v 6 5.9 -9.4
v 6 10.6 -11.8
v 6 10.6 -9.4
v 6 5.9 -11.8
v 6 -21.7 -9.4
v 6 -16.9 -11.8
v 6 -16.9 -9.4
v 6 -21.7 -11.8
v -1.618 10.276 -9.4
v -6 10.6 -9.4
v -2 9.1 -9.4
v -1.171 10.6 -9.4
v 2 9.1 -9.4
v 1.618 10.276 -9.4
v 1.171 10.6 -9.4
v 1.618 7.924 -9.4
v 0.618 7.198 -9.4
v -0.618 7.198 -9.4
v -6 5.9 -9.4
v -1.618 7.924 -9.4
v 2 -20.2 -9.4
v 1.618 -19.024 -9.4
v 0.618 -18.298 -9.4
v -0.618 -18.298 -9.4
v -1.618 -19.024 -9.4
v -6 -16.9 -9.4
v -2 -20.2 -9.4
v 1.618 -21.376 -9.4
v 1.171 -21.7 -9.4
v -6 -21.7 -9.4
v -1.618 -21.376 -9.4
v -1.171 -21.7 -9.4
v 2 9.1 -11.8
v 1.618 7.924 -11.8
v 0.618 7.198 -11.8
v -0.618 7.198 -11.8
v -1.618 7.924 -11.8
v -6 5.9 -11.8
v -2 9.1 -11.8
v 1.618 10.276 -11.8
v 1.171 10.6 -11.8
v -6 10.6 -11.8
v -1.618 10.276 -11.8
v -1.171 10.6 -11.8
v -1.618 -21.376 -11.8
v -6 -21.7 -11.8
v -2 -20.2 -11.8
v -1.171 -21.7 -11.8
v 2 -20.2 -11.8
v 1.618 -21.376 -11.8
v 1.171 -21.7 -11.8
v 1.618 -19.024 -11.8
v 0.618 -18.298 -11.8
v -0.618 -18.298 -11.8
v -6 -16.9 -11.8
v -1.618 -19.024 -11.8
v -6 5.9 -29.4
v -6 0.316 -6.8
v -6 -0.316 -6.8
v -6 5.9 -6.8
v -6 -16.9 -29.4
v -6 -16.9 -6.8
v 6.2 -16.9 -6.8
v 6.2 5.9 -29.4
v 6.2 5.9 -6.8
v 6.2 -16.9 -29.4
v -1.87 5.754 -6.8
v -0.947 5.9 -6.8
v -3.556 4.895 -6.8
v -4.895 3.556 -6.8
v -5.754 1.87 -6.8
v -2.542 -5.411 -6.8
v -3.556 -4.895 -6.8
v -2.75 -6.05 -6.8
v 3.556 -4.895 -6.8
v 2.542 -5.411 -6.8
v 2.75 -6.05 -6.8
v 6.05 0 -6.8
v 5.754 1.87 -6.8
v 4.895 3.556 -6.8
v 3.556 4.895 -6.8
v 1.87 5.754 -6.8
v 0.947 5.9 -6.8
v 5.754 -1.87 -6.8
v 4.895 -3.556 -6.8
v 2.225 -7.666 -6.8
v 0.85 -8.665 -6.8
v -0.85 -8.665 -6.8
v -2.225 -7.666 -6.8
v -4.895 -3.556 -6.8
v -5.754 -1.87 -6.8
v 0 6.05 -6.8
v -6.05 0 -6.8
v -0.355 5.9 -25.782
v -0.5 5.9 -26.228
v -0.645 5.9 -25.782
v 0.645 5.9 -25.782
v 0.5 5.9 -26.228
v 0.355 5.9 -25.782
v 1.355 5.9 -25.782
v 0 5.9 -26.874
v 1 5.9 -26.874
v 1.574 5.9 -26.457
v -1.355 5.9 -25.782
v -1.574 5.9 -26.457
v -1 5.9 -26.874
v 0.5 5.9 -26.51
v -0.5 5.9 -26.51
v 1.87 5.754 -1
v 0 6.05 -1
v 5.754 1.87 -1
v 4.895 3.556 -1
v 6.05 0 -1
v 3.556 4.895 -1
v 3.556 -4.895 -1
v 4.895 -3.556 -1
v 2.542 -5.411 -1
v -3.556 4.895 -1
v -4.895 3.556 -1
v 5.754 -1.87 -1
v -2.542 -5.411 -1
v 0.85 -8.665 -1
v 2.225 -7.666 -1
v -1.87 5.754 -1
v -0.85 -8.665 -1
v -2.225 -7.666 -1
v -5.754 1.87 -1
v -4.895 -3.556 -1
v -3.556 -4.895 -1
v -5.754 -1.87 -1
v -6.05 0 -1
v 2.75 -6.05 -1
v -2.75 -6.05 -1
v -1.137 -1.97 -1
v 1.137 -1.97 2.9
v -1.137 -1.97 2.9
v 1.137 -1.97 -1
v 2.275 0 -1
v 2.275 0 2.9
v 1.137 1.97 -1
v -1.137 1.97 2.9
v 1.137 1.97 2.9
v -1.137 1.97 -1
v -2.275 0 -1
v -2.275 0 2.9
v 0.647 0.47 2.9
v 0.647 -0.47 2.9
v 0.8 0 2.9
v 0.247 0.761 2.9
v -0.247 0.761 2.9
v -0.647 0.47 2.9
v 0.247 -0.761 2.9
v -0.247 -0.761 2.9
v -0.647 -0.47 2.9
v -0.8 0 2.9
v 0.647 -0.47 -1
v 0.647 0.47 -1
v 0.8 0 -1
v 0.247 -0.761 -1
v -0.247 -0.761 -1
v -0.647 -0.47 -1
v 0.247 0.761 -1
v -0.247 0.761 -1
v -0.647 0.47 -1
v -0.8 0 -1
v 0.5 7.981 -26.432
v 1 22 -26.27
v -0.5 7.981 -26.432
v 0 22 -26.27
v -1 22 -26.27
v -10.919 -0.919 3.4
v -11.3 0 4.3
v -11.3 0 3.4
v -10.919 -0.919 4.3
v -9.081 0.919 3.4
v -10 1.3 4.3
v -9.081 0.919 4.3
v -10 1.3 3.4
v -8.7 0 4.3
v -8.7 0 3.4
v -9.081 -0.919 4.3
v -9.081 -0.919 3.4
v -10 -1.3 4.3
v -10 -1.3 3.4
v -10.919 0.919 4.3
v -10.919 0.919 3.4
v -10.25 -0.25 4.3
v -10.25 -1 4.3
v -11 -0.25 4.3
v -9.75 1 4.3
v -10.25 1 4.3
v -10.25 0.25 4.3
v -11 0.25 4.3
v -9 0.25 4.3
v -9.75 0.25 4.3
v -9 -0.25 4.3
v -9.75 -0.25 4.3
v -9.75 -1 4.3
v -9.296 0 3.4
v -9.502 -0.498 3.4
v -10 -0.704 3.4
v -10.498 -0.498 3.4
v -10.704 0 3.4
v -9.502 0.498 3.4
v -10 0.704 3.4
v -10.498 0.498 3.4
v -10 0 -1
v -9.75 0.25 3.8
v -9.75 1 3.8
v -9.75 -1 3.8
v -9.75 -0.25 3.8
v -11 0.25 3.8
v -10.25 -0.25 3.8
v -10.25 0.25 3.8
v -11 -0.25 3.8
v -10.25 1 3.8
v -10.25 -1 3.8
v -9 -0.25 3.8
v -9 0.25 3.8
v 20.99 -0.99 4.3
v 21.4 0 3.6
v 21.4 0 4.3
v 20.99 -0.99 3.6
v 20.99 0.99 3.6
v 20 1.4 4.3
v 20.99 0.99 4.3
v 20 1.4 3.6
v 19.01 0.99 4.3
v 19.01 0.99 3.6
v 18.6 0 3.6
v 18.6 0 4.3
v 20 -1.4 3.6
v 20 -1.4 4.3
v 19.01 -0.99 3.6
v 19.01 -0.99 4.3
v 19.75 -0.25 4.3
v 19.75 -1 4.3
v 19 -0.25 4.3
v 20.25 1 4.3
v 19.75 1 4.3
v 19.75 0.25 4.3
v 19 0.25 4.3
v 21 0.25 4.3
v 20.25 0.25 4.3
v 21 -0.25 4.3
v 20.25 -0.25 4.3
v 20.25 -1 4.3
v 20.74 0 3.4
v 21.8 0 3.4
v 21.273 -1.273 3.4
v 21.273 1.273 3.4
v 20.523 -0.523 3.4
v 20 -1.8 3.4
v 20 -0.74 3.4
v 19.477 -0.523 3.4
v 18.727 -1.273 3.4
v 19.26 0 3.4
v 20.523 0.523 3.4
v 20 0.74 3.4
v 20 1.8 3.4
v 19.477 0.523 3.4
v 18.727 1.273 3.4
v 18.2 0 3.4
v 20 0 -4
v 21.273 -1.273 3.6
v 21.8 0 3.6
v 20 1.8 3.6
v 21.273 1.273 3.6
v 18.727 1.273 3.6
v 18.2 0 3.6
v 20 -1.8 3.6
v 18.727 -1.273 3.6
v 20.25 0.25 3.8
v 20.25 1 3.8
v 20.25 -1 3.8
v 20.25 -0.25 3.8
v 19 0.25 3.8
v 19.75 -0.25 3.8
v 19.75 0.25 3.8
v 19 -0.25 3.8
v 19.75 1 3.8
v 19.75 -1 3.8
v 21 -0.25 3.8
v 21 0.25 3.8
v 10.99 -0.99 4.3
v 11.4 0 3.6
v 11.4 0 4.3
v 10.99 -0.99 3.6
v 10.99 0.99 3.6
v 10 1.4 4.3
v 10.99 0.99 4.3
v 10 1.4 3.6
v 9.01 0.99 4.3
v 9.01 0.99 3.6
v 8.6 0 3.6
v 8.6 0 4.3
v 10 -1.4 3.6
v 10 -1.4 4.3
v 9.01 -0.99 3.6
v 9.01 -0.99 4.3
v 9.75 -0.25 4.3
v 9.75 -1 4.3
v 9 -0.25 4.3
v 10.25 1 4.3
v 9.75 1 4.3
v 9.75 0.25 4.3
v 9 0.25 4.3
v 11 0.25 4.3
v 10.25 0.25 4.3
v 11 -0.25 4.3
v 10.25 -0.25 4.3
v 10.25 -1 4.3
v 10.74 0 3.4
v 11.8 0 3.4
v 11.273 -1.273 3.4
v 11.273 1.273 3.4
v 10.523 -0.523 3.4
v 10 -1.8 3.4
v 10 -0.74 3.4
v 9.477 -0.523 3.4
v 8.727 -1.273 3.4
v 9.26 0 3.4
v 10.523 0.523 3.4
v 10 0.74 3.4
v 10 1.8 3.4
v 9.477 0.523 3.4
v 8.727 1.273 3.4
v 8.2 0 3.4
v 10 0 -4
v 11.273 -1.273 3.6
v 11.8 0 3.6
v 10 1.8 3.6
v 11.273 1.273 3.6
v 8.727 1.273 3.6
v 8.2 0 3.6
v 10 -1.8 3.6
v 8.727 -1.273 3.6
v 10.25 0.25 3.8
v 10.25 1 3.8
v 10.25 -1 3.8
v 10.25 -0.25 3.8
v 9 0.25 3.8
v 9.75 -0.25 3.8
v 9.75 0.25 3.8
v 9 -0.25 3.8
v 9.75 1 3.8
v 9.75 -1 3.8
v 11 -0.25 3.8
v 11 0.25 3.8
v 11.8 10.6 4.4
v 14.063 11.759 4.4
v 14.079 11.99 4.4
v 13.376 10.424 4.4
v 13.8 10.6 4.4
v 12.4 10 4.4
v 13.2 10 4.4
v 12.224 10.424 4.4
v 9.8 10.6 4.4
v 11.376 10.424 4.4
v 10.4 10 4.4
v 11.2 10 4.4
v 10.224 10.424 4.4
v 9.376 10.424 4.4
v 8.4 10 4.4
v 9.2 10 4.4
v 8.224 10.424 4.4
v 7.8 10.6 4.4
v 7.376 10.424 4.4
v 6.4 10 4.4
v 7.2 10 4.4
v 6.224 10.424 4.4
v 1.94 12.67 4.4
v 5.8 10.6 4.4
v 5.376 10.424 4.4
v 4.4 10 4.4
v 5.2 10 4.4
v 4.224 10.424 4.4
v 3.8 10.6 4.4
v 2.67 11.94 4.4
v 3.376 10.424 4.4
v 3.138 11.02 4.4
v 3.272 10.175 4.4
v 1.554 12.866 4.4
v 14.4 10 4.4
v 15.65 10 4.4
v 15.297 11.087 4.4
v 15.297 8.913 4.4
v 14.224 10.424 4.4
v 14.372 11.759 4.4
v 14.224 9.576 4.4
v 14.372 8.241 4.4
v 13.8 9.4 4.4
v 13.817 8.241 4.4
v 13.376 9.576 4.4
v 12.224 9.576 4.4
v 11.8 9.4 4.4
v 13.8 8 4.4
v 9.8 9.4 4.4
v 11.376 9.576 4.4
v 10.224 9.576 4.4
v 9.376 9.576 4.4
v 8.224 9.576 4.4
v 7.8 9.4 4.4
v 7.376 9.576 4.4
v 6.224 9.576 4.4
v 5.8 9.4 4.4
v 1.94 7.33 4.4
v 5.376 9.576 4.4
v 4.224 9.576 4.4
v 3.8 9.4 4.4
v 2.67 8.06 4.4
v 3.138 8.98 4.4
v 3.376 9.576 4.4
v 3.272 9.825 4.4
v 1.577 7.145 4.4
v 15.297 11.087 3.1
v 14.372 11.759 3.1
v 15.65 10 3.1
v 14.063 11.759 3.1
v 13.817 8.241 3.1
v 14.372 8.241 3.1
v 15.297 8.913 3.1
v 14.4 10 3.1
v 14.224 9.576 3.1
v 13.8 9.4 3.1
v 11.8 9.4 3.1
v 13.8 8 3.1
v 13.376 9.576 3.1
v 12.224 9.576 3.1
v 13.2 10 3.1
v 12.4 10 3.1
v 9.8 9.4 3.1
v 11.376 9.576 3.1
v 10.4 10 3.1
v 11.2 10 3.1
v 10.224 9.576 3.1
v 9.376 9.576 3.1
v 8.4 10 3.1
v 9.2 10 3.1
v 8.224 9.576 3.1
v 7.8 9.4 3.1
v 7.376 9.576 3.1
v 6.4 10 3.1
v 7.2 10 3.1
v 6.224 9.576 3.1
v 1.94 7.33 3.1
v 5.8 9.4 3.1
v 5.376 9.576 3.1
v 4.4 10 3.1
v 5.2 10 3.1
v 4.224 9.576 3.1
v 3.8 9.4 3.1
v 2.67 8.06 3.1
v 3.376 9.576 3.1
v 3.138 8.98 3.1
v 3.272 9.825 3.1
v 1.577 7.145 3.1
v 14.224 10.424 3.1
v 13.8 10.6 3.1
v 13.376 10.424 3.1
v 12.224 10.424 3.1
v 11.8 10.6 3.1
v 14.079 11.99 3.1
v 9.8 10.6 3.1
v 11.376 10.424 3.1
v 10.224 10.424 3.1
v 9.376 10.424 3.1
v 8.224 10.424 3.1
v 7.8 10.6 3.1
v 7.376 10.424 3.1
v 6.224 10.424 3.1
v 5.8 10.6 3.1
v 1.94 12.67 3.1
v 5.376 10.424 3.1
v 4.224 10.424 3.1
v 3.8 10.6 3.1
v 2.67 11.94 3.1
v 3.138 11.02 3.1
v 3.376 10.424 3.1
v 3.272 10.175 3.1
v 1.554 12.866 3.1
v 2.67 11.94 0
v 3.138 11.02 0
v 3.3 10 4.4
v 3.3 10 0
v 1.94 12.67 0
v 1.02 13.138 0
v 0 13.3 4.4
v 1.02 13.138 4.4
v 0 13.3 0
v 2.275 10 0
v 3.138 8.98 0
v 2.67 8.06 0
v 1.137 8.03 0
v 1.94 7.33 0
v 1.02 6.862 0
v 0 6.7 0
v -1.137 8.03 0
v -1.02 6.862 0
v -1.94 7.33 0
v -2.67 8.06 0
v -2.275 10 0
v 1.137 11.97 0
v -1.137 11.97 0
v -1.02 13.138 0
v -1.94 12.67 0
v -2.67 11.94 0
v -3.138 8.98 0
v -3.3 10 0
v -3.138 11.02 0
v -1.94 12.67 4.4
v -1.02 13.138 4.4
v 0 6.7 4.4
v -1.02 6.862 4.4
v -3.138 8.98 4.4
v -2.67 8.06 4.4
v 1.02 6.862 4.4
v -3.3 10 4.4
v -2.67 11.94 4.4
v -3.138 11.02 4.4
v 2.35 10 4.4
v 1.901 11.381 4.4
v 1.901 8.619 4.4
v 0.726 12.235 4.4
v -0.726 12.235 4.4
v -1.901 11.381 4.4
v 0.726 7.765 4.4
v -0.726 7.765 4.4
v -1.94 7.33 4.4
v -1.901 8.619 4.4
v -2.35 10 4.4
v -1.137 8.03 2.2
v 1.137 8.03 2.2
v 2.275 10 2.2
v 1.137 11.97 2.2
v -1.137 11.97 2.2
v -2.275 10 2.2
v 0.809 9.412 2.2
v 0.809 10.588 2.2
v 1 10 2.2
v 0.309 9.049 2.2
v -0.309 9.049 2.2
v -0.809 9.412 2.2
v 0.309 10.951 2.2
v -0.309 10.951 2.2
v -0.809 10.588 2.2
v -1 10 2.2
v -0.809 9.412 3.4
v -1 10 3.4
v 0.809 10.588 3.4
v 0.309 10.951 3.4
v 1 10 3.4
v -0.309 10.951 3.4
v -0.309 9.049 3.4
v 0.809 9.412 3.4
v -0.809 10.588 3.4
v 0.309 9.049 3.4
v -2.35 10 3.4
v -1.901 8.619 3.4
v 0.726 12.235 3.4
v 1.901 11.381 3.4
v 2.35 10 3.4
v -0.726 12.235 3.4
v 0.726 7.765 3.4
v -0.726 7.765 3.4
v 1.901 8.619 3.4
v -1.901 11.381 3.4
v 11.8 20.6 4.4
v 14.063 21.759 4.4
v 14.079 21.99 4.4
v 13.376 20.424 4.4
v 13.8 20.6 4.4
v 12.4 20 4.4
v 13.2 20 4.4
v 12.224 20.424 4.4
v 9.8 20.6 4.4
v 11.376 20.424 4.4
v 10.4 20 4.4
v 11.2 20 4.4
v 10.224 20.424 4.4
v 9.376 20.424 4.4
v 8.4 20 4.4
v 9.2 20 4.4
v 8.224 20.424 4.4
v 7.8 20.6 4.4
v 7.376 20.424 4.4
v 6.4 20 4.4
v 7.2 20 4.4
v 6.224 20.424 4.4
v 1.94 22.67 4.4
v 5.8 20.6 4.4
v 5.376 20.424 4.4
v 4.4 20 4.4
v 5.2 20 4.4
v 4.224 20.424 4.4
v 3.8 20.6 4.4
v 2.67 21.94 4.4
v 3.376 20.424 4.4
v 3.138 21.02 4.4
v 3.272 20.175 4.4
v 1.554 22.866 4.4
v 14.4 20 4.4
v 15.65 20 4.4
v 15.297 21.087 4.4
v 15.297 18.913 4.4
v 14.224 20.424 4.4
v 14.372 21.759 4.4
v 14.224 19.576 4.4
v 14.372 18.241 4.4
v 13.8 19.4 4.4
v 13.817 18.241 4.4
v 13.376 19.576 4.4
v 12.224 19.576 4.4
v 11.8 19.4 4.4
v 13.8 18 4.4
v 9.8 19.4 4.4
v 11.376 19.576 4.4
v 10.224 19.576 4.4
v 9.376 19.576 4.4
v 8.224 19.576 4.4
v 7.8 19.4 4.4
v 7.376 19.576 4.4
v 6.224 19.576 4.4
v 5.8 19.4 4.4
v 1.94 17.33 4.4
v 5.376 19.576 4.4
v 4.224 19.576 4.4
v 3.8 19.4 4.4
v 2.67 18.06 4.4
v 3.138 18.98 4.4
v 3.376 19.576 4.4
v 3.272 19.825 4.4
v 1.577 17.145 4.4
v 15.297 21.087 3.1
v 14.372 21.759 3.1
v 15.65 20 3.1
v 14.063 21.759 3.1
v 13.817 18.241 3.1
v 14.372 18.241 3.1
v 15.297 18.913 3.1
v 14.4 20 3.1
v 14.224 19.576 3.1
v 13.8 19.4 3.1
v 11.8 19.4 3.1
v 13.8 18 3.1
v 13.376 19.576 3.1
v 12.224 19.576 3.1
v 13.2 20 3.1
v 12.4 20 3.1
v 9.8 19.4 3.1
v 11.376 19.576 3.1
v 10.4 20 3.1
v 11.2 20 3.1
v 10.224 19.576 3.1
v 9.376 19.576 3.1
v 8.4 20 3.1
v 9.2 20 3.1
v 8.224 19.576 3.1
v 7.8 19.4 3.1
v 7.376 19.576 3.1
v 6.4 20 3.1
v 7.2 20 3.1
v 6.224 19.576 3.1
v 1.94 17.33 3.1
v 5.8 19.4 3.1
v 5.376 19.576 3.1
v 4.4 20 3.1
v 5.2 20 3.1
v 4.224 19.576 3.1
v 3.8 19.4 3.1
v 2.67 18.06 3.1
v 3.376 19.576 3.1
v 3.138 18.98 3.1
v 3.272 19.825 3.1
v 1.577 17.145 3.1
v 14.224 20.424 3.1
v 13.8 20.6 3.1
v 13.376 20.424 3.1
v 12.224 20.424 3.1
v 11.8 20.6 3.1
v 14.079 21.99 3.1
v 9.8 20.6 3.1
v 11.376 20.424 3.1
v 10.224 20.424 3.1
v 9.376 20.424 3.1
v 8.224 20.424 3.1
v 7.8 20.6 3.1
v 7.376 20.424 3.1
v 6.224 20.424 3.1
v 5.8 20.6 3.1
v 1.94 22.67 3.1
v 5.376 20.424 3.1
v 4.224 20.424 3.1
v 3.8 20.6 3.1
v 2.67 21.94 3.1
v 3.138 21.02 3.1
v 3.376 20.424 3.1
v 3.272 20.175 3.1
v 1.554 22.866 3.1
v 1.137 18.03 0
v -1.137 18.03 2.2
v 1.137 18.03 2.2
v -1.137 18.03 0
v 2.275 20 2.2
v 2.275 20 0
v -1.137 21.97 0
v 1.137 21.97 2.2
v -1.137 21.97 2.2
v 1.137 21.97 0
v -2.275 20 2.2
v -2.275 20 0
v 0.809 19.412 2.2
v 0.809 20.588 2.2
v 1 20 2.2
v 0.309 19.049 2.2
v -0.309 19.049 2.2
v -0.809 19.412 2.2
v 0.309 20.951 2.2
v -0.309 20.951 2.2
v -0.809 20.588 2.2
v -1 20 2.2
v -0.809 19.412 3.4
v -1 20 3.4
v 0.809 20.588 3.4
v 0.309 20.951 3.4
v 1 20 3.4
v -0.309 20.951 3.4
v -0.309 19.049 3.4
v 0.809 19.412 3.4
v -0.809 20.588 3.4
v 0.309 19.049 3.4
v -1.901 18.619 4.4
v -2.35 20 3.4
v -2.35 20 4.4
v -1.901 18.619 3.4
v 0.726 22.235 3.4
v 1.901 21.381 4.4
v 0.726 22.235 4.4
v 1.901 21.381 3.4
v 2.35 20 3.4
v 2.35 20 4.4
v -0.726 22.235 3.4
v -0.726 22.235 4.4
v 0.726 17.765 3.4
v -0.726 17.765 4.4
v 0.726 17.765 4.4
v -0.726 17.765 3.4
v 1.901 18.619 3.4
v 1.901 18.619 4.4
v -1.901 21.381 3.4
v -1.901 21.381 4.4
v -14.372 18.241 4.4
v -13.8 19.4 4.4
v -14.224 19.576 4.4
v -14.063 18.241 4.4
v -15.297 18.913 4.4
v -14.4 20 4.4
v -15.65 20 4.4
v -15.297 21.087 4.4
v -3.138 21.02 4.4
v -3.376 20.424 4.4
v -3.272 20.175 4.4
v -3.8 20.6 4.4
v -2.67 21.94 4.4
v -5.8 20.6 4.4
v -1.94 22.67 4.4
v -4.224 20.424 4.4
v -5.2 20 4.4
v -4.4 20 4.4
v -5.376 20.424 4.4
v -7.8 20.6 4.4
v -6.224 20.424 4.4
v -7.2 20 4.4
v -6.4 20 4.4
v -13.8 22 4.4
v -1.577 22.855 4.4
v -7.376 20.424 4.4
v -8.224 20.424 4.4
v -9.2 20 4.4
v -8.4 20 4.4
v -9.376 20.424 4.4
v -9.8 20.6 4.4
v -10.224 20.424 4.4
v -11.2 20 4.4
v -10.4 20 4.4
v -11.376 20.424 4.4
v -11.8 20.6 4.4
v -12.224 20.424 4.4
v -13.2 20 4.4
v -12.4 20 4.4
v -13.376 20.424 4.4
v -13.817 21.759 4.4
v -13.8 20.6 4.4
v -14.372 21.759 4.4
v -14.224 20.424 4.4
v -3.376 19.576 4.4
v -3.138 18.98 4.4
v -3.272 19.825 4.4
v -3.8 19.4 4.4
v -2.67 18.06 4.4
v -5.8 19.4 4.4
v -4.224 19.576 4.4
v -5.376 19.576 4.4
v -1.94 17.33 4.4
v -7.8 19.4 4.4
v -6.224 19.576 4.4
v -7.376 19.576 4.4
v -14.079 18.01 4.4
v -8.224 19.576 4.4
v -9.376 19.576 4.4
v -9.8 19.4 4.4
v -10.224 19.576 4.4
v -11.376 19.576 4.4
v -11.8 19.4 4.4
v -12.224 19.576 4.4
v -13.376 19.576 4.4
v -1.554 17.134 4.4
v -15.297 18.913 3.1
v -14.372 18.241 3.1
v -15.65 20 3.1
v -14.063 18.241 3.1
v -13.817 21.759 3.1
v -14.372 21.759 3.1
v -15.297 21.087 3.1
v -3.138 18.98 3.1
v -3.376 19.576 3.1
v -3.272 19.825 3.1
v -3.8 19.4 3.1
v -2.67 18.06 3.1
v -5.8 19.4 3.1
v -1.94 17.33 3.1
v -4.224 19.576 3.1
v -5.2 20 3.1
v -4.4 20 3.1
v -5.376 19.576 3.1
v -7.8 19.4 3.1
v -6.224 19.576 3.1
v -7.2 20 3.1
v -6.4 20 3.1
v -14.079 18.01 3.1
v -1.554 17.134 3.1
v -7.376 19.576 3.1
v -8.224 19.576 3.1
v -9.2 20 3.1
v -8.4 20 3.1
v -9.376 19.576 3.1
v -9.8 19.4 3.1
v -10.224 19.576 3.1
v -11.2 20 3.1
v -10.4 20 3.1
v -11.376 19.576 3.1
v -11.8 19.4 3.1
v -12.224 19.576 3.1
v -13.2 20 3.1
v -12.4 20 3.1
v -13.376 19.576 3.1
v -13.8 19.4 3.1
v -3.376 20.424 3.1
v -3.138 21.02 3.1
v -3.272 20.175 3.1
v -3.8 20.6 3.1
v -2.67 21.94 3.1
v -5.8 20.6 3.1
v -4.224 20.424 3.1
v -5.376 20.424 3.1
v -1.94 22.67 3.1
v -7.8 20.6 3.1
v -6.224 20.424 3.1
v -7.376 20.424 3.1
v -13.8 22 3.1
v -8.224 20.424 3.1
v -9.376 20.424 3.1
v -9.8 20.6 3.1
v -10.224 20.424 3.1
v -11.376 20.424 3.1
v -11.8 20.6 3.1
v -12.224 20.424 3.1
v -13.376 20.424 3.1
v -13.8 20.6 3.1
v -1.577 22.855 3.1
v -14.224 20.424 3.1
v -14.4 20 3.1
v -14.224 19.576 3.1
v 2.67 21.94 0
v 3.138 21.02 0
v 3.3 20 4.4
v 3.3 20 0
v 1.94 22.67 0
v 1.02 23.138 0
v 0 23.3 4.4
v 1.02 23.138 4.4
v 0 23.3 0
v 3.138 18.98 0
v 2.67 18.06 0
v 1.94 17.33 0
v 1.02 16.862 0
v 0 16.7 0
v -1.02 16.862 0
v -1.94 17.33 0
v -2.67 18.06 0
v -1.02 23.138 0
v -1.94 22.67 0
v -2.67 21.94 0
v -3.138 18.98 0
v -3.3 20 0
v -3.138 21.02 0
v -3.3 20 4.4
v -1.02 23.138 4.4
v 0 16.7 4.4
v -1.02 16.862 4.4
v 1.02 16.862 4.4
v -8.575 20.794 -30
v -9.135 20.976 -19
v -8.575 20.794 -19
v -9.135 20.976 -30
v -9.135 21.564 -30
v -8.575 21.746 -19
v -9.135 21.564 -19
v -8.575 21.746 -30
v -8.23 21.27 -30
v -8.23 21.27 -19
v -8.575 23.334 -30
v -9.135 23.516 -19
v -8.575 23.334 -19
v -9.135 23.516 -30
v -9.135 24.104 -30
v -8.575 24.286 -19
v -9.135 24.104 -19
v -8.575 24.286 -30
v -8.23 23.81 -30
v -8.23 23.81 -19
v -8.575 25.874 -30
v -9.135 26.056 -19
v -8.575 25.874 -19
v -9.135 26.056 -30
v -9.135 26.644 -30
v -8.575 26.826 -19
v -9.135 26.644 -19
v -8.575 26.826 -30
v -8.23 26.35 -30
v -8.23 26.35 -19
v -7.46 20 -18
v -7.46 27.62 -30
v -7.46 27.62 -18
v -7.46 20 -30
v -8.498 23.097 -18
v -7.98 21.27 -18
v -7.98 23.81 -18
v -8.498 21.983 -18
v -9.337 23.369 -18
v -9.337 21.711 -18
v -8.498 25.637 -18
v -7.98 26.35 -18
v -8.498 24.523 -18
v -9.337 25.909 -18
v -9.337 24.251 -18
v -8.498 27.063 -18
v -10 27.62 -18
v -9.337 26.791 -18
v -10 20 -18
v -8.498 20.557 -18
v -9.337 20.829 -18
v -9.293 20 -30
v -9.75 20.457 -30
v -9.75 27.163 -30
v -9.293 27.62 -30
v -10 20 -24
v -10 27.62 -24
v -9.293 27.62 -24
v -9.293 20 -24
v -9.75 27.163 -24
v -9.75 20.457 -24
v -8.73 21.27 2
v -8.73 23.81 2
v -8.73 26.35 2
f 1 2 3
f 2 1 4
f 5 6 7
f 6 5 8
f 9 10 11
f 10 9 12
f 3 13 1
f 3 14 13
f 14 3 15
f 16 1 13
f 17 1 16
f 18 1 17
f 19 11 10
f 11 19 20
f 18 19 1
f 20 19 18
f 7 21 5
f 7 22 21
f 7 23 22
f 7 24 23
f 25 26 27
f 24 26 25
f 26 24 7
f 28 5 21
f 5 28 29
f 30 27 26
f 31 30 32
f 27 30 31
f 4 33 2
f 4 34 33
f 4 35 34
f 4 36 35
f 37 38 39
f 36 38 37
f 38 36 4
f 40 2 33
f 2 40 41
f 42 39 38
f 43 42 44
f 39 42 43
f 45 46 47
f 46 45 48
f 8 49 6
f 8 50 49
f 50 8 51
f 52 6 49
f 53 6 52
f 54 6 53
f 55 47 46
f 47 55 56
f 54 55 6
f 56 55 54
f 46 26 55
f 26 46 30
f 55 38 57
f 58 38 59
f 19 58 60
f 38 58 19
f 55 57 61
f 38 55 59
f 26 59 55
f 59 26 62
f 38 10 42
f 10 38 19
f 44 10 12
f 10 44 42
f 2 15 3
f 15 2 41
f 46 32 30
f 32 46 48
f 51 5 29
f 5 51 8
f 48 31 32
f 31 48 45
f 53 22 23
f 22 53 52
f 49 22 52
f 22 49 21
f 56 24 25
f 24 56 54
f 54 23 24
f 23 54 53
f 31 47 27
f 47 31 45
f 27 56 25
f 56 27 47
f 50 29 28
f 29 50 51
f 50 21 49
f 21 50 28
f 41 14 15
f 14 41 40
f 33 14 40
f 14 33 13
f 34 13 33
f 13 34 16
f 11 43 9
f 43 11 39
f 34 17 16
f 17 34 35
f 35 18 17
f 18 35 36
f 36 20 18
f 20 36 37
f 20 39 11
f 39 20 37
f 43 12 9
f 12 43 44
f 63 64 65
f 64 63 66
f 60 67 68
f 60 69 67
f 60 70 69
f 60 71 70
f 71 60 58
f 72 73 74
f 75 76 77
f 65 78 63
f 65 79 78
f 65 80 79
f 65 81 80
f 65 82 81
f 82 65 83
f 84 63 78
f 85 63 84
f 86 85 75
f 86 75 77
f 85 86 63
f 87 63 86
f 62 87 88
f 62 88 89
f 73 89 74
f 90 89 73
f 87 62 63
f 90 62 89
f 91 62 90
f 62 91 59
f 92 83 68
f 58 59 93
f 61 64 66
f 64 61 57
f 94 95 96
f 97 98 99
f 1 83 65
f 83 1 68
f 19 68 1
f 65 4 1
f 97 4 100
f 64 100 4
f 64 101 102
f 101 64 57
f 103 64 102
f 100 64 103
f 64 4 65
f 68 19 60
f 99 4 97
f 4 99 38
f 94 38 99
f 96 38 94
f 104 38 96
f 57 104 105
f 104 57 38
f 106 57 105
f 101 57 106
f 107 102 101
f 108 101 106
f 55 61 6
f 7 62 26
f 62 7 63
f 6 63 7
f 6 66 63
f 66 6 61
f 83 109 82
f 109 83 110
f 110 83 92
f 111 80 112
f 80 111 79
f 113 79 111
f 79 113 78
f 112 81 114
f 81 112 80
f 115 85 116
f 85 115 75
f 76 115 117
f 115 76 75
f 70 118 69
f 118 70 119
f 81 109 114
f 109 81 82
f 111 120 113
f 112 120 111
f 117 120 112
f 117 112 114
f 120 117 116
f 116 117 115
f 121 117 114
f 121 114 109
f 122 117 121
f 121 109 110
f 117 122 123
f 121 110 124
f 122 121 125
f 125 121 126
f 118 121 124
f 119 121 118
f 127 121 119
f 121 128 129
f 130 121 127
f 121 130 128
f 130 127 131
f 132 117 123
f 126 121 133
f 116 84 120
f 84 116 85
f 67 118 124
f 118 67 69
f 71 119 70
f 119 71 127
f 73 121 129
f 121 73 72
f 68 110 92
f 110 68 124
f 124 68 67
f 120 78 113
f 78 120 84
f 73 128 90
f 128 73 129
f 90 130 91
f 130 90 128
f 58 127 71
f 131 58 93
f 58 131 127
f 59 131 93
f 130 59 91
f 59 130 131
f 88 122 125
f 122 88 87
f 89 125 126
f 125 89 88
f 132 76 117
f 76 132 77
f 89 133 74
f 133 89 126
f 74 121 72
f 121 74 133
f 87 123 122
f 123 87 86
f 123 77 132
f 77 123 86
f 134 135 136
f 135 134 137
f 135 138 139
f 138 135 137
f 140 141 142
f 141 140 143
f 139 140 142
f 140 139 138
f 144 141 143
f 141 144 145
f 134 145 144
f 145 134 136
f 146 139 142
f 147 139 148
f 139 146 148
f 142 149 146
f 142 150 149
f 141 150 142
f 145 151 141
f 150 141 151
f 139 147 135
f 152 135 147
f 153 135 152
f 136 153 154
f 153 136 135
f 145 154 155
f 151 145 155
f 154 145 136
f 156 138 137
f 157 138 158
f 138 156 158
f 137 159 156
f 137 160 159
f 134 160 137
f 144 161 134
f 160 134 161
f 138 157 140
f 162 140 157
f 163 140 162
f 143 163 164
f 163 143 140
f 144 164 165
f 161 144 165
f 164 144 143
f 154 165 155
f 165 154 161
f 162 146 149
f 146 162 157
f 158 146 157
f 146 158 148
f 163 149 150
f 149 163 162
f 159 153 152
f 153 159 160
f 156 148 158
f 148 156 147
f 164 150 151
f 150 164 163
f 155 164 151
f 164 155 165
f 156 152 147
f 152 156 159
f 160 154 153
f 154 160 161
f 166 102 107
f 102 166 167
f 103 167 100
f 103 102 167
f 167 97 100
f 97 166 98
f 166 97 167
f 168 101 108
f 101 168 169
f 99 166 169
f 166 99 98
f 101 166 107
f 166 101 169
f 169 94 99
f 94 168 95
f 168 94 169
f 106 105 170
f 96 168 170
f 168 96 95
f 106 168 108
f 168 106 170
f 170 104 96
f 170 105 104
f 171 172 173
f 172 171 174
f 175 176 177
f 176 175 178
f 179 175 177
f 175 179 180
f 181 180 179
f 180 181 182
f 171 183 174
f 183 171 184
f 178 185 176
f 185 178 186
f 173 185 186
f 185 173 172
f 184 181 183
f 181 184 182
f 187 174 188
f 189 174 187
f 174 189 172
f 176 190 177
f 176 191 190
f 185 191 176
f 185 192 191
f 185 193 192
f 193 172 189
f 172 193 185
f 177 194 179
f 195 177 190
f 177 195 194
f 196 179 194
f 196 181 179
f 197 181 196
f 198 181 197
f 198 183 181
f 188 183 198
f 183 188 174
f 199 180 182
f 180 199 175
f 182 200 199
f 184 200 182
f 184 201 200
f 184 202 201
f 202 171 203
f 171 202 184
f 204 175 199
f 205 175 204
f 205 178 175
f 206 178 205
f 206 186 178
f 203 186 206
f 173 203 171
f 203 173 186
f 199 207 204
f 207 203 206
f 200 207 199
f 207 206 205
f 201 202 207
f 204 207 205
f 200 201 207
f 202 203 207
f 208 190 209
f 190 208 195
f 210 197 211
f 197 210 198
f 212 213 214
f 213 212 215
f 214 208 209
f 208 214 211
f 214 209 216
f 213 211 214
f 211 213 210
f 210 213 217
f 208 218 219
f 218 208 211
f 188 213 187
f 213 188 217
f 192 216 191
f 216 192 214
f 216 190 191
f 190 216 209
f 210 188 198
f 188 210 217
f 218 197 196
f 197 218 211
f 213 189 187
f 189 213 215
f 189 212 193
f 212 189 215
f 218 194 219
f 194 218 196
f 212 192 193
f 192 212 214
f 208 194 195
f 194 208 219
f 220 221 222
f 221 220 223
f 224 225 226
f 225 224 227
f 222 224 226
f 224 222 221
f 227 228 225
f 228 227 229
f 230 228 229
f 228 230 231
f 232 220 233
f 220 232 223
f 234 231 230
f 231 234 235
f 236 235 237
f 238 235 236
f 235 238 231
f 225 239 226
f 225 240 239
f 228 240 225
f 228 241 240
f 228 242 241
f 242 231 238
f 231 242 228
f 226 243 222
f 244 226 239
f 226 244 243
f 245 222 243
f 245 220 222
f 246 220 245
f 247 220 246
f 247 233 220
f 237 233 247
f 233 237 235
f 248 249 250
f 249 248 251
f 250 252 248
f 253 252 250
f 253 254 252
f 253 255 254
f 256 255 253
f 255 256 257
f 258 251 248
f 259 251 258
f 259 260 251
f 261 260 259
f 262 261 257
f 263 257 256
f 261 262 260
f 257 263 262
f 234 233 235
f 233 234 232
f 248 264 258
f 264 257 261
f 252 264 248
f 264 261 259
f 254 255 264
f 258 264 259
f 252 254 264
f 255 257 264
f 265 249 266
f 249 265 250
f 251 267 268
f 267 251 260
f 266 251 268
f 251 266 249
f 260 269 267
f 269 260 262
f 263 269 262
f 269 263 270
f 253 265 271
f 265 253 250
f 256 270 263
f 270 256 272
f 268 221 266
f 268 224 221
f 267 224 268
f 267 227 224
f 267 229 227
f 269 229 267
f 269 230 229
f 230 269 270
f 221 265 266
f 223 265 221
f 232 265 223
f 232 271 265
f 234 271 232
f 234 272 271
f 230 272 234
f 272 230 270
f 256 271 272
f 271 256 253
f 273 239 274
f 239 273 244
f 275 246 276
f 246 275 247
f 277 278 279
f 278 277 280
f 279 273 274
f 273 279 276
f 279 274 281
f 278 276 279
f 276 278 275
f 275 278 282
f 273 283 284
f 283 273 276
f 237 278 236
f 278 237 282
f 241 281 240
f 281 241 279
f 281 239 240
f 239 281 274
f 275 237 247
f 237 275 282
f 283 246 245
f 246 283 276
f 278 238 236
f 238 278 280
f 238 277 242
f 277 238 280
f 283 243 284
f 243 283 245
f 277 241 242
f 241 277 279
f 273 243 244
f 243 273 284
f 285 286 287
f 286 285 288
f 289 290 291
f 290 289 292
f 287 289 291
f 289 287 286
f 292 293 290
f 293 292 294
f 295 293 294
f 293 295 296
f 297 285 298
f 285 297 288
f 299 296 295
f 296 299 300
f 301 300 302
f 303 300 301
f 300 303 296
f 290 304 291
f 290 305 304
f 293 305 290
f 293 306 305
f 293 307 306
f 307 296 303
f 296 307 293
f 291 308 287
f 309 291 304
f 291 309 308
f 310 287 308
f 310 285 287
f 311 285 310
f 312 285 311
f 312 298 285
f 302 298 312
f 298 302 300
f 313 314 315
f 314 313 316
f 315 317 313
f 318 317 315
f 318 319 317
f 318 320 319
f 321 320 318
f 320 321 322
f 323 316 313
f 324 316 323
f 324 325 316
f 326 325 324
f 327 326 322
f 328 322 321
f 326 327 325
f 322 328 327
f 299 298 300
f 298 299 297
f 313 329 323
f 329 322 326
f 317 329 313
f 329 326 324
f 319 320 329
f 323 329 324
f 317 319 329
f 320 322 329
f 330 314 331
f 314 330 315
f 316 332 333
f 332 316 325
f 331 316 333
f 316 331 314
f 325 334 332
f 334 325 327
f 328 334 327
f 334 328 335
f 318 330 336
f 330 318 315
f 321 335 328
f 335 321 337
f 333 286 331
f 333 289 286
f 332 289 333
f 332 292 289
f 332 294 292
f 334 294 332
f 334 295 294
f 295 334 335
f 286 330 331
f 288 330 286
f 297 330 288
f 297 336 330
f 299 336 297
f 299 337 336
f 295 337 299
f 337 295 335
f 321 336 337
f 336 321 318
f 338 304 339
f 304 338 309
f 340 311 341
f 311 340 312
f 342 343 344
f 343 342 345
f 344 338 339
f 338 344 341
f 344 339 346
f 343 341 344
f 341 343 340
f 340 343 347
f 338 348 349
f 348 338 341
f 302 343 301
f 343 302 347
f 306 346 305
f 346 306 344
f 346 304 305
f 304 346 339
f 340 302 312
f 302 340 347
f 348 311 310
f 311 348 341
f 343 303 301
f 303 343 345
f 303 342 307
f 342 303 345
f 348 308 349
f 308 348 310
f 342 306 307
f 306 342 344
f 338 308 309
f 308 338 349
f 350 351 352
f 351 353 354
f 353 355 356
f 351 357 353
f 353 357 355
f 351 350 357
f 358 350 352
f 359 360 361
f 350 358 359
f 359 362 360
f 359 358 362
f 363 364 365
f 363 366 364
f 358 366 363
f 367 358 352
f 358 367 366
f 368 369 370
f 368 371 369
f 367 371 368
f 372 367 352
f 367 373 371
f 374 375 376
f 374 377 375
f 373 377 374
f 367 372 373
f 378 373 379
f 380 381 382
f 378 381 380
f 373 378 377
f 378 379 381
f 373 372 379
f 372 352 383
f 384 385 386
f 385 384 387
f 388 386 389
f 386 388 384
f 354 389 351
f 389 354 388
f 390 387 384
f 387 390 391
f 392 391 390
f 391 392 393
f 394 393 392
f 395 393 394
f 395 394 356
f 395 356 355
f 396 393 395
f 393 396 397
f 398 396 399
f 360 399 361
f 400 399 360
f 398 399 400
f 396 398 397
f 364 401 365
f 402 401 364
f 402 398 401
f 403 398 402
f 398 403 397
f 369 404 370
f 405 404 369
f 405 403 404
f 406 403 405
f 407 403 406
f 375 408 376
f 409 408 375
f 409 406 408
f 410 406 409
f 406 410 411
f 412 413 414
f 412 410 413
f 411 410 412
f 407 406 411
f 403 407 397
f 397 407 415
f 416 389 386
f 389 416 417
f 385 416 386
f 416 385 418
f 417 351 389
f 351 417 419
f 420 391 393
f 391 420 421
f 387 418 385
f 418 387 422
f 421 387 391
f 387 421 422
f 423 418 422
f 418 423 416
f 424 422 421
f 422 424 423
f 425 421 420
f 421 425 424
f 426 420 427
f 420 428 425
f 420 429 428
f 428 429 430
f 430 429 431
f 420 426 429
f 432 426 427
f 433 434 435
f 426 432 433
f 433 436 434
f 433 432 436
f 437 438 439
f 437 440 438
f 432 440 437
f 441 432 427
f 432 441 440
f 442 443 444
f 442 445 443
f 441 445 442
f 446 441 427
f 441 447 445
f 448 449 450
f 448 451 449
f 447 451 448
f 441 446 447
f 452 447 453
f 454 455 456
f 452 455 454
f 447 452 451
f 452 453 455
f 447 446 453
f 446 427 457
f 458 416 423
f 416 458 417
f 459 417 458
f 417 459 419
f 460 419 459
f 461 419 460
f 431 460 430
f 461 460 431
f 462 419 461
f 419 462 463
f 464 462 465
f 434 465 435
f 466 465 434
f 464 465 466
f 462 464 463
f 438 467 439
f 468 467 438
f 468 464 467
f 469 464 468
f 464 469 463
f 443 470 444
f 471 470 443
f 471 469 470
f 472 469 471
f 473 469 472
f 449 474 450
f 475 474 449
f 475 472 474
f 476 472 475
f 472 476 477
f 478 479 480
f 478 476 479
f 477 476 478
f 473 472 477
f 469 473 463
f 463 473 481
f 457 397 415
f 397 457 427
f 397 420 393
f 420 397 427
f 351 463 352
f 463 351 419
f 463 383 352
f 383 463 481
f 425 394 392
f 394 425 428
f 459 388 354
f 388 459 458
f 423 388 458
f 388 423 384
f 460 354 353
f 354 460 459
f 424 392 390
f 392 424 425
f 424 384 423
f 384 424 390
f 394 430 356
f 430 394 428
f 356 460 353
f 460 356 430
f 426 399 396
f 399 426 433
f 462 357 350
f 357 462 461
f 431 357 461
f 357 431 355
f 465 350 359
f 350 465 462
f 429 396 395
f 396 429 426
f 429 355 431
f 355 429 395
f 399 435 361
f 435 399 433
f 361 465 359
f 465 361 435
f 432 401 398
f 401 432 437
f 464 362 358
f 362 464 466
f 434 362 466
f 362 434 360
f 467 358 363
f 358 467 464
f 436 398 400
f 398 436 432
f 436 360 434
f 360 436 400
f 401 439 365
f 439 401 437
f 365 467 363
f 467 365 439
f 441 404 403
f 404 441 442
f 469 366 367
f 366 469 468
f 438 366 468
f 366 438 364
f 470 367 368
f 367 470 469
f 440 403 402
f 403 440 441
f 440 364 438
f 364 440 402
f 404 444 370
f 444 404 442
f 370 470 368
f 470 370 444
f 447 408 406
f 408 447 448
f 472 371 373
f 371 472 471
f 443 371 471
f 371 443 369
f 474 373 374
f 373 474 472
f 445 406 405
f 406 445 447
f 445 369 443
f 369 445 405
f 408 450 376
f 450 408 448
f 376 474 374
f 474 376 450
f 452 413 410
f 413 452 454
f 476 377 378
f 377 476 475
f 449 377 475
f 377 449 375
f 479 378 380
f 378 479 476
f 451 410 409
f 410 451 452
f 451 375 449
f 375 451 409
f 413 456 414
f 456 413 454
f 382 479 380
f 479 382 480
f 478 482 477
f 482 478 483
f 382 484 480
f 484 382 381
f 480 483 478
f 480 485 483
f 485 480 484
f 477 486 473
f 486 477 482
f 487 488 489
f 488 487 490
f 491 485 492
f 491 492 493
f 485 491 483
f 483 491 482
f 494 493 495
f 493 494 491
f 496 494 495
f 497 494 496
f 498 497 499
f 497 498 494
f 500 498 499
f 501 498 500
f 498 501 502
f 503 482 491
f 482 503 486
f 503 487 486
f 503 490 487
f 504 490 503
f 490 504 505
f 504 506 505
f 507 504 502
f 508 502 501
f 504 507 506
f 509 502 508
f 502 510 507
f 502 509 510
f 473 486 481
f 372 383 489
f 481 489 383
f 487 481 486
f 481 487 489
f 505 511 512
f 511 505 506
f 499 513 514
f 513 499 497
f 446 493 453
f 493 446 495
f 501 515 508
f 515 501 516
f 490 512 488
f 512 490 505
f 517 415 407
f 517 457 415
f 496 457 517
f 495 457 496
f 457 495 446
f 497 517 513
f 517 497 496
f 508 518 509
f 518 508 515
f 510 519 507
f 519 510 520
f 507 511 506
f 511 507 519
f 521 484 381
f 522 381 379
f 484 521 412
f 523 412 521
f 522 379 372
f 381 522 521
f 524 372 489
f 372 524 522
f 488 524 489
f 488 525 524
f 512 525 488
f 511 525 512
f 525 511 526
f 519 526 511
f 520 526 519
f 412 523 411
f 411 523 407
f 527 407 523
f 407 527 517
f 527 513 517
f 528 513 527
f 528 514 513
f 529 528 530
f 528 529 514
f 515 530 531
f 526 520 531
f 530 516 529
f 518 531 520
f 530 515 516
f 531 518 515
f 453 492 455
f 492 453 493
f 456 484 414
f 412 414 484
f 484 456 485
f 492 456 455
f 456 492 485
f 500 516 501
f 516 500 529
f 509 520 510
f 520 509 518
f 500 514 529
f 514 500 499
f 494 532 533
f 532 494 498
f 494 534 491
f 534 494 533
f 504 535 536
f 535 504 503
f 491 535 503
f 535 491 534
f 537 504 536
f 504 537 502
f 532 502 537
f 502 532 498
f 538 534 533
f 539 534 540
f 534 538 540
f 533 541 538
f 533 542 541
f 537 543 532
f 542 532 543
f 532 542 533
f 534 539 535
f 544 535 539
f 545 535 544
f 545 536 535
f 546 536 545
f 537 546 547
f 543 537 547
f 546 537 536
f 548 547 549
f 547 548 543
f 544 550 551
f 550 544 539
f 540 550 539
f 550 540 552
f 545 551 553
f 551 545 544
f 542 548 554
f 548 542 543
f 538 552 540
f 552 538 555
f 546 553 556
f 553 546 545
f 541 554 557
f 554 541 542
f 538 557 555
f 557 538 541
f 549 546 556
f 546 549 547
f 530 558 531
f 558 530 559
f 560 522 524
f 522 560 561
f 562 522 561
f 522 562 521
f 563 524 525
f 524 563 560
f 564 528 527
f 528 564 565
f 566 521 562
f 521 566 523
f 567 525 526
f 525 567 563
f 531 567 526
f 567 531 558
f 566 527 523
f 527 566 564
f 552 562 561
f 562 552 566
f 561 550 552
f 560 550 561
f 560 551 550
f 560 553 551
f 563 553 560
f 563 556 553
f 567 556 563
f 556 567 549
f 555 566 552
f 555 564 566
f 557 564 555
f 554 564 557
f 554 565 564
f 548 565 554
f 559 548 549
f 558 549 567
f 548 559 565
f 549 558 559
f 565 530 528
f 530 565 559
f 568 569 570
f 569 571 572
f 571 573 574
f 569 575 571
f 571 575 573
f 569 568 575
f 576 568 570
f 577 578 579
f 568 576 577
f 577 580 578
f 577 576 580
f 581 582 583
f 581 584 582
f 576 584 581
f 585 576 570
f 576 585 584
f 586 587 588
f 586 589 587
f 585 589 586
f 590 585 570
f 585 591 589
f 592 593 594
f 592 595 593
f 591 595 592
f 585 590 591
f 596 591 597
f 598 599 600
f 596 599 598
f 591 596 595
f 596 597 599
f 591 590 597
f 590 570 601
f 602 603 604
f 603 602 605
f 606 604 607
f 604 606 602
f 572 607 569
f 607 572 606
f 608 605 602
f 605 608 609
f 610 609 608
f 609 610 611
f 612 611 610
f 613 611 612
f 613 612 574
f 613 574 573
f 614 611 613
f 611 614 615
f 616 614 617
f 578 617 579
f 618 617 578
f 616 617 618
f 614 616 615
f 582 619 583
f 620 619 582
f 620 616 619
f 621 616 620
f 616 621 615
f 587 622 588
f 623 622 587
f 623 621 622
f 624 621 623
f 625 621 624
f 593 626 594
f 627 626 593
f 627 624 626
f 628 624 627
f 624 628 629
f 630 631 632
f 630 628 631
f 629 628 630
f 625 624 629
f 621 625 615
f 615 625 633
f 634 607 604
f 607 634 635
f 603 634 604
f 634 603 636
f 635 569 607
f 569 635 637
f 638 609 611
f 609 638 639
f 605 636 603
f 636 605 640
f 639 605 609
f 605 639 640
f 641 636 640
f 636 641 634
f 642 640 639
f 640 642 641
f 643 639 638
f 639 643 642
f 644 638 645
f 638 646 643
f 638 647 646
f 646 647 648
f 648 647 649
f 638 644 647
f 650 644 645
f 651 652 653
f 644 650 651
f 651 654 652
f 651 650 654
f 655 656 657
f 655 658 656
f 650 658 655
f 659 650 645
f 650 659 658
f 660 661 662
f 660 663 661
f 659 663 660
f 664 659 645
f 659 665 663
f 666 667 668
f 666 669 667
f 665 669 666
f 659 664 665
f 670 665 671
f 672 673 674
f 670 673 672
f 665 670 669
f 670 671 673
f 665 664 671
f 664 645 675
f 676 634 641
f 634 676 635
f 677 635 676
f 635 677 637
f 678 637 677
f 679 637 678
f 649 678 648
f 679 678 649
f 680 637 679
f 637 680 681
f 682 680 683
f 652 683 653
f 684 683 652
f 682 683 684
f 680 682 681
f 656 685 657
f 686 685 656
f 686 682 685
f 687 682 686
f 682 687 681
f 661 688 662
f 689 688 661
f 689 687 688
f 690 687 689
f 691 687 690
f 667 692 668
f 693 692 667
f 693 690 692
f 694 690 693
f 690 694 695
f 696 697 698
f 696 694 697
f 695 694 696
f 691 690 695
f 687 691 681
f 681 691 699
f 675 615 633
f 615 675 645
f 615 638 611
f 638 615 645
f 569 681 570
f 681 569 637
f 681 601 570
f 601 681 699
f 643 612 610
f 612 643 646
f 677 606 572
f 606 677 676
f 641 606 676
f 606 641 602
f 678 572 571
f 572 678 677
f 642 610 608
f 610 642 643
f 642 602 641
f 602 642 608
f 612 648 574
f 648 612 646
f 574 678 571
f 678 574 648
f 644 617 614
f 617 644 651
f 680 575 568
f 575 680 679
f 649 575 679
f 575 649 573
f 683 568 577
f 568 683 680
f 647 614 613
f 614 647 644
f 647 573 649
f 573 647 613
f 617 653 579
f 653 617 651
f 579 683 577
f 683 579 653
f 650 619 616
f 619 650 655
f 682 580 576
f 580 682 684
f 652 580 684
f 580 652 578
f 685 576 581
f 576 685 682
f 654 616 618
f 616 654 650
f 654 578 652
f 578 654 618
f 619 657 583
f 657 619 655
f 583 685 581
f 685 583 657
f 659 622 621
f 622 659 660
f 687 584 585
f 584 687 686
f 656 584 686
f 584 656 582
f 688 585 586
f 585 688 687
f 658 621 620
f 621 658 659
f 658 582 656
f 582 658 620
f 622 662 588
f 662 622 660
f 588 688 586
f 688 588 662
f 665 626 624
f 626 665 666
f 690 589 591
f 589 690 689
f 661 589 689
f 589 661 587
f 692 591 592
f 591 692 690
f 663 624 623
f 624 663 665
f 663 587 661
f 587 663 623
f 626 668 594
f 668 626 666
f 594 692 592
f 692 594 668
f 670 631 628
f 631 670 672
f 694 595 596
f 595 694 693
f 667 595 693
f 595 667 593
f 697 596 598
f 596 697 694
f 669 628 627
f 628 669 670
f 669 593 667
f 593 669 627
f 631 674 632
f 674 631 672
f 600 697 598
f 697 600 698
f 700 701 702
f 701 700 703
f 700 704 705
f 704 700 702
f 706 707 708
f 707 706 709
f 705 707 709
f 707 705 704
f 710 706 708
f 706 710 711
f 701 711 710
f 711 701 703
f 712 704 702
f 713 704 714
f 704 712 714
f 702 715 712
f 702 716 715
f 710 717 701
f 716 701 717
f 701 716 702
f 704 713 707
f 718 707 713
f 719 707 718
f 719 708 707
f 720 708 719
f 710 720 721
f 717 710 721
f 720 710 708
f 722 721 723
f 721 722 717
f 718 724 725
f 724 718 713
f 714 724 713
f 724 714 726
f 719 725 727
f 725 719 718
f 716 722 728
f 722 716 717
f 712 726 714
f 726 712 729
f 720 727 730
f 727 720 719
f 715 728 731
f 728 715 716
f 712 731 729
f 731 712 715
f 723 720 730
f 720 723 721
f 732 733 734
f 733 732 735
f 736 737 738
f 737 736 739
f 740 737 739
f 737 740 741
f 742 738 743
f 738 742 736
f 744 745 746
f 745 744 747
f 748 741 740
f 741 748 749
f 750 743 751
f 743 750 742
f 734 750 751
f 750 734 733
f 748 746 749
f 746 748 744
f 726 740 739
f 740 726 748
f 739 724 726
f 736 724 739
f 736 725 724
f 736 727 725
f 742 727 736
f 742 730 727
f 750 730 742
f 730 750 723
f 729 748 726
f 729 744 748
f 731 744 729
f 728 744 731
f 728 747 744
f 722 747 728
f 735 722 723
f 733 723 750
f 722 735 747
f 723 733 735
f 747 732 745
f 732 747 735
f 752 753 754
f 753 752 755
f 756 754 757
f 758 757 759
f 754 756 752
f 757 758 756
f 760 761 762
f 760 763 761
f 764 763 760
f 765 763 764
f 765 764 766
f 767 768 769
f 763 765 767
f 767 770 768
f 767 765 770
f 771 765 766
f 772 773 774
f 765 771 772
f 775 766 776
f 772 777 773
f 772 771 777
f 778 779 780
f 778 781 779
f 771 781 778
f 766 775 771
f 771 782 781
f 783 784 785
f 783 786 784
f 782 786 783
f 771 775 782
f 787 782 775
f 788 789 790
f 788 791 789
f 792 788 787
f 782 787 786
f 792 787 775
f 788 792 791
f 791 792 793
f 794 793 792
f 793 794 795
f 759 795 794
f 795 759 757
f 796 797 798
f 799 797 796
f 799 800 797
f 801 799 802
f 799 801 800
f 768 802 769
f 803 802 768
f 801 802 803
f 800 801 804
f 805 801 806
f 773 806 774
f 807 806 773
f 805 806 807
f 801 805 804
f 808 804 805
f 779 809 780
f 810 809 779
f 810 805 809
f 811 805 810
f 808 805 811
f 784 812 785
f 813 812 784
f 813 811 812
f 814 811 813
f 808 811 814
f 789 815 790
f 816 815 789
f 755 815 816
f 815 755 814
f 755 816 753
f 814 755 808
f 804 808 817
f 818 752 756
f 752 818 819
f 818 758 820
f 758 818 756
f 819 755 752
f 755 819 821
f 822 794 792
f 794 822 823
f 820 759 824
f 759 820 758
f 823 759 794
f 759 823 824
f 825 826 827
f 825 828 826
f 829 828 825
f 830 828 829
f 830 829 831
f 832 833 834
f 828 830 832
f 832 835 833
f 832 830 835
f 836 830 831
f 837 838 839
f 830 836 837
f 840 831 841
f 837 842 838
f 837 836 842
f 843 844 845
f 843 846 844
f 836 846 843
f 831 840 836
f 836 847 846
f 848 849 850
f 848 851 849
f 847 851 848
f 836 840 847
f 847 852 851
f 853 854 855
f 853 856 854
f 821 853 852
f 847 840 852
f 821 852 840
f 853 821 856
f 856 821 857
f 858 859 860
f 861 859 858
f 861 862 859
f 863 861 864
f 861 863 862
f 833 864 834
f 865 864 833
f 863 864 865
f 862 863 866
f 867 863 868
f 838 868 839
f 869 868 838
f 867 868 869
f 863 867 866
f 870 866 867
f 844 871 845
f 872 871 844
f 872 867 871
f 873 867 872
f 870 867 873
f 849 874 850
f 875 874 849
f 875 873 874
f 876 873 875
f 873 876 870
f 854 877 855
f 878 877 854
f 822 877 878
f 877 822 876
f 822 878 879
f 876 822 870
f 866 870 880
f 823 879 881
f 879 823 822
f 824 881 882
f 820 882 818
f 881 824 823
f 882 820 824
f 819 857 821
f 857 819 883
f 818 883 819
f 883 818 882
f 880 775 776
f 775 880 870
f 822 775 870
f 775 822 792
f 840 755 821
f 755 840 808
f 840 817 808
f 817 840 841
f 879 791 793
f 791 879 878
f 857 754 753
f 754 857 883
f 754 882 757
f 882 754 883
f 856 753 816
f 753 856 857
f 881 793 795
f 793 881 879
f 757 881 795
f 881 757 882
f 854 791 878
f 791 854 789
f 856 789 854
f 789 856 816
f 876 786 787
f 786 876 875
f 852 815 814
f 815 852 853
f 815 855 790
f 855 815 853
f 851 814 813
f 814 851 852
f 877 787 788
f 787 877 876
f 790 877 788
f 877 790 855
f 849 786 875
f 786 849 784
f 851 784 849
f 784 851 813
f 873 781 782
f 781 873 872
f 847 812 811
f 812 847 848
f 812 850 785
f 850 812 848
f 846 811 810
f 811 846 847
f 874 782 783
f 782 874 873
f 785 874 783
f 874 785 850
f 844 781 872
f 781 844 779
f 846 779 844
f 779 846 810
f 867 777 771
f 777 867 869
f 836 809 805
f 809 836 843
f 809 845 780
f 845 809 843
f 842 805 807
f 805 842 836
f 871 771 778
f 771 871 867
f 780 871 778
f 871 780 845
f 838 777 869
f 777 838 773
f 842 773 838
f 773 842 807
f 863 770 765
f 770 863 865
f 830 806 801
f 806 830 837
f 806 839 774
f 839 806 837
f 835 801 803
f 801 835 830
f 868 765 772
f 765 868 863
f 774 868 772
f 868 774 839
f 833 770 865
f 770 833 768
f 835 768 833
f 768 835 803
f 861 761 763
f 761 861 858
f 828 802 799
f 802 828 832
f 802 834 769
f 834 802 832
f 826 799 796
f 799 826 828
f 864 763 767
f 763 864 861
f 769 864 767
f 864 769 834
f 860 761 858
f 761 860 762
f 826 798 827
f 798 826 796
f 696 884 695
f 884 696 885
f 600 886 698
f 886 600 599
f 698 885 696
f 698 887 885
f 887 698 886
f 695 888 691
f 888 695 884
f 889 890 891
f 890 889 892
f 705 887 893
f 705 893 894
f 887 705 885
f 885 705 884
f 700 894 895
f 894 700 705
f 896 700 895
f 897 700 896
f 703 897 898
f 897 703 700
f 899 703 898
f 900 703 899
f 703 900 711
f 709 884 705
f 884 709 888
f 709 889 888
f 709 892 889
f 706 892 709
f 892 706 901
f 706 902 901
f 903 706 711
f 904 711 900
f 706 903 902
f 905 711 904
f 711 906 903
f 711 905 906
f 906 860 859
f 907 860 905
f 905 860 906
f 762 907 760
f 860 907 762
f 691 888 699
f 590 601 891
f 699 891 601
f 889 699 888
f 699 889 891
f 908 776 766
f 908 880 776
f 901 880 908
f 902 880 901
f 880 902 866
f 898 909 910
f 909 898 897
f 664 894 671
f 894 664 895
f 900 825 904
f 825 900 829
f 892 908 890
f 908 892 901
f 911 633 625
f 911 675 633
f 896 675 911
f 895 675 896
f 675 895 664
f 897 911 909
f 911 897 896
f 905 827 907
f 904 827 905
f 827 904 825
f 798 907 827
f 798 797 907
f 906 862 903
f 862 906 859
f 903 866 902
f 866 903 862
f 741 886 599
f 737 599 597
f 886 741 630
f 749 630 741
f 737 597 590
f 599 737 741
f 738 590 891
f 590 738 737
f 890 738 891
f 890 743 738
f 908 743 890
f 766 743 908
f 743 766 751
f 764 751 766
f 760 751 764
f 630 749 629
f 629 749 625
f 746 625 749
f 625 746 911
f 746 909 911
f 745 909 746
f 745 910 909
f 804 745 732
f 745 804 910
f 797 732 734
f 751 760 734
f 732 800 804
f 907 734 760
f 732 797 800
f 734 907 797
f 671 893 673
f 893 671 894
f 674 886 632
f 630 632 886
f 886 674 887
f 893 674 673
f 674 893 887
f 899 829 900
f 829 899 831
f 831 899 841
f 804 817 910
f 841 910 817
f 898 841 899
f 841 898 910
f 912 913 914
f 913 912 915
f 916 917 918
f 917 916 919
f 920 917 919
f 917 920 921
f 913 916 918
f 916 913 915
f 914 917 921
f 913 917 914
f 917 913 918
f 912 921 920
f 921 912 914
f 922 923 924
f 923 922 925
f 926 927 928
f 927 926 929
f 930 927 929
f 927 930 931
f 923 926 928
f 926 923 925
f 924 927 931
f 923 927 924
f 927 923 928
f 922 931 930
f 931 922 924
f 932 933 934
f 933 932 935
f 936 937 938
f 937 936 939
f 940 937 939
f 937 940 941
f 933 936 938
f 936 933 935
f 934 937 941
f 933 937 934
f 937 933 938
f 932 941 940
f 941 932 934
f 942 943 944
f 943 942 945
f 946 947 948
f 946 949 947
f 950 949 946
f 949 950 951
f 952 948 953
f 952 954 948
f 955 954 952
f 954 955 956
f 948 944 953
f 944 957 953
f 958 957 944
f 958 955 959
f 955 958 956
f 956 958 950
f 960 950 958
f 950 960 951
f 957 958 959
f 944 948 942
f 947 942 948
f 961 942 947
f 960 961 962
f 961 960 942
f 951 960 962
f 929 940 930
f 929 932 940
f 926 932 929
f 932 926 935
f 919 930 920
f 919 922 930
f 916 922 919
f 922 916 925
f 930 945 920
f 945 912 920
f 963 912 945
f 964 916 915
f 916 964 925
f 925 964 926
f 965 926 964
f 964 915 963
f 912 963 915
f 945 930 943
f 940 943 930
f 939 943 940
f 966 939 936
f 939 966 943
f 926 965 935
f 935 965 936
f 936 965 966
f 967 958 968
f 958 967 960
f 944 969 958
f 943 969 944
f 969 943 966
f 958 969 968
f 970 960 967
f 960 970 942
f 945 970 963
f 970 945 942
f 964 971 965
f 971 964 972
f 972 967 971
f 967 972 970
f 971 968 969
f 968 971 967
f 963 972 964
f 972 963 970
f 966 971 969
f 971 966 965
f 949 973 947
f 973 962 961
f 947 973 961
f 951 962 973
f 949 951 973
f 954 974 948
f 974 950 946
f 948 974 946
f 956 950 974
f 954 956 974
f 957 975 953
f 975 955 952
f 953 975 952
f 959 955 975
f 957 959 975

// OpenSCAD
use <parts.scad>;

SG90();
translate([-10, 0, 0]) SG90_horn_screw();
translate([20, 0, 0]) SG90_mount_screw();
translate([10, 0, 0]) SG90_mount_screw();
translate([0, 10, 0]) SG90_single_horn();
translate([0, 20, 0]) SG90_double_horn();
translate([-10, 20, -30]) rc_servo_plug();
